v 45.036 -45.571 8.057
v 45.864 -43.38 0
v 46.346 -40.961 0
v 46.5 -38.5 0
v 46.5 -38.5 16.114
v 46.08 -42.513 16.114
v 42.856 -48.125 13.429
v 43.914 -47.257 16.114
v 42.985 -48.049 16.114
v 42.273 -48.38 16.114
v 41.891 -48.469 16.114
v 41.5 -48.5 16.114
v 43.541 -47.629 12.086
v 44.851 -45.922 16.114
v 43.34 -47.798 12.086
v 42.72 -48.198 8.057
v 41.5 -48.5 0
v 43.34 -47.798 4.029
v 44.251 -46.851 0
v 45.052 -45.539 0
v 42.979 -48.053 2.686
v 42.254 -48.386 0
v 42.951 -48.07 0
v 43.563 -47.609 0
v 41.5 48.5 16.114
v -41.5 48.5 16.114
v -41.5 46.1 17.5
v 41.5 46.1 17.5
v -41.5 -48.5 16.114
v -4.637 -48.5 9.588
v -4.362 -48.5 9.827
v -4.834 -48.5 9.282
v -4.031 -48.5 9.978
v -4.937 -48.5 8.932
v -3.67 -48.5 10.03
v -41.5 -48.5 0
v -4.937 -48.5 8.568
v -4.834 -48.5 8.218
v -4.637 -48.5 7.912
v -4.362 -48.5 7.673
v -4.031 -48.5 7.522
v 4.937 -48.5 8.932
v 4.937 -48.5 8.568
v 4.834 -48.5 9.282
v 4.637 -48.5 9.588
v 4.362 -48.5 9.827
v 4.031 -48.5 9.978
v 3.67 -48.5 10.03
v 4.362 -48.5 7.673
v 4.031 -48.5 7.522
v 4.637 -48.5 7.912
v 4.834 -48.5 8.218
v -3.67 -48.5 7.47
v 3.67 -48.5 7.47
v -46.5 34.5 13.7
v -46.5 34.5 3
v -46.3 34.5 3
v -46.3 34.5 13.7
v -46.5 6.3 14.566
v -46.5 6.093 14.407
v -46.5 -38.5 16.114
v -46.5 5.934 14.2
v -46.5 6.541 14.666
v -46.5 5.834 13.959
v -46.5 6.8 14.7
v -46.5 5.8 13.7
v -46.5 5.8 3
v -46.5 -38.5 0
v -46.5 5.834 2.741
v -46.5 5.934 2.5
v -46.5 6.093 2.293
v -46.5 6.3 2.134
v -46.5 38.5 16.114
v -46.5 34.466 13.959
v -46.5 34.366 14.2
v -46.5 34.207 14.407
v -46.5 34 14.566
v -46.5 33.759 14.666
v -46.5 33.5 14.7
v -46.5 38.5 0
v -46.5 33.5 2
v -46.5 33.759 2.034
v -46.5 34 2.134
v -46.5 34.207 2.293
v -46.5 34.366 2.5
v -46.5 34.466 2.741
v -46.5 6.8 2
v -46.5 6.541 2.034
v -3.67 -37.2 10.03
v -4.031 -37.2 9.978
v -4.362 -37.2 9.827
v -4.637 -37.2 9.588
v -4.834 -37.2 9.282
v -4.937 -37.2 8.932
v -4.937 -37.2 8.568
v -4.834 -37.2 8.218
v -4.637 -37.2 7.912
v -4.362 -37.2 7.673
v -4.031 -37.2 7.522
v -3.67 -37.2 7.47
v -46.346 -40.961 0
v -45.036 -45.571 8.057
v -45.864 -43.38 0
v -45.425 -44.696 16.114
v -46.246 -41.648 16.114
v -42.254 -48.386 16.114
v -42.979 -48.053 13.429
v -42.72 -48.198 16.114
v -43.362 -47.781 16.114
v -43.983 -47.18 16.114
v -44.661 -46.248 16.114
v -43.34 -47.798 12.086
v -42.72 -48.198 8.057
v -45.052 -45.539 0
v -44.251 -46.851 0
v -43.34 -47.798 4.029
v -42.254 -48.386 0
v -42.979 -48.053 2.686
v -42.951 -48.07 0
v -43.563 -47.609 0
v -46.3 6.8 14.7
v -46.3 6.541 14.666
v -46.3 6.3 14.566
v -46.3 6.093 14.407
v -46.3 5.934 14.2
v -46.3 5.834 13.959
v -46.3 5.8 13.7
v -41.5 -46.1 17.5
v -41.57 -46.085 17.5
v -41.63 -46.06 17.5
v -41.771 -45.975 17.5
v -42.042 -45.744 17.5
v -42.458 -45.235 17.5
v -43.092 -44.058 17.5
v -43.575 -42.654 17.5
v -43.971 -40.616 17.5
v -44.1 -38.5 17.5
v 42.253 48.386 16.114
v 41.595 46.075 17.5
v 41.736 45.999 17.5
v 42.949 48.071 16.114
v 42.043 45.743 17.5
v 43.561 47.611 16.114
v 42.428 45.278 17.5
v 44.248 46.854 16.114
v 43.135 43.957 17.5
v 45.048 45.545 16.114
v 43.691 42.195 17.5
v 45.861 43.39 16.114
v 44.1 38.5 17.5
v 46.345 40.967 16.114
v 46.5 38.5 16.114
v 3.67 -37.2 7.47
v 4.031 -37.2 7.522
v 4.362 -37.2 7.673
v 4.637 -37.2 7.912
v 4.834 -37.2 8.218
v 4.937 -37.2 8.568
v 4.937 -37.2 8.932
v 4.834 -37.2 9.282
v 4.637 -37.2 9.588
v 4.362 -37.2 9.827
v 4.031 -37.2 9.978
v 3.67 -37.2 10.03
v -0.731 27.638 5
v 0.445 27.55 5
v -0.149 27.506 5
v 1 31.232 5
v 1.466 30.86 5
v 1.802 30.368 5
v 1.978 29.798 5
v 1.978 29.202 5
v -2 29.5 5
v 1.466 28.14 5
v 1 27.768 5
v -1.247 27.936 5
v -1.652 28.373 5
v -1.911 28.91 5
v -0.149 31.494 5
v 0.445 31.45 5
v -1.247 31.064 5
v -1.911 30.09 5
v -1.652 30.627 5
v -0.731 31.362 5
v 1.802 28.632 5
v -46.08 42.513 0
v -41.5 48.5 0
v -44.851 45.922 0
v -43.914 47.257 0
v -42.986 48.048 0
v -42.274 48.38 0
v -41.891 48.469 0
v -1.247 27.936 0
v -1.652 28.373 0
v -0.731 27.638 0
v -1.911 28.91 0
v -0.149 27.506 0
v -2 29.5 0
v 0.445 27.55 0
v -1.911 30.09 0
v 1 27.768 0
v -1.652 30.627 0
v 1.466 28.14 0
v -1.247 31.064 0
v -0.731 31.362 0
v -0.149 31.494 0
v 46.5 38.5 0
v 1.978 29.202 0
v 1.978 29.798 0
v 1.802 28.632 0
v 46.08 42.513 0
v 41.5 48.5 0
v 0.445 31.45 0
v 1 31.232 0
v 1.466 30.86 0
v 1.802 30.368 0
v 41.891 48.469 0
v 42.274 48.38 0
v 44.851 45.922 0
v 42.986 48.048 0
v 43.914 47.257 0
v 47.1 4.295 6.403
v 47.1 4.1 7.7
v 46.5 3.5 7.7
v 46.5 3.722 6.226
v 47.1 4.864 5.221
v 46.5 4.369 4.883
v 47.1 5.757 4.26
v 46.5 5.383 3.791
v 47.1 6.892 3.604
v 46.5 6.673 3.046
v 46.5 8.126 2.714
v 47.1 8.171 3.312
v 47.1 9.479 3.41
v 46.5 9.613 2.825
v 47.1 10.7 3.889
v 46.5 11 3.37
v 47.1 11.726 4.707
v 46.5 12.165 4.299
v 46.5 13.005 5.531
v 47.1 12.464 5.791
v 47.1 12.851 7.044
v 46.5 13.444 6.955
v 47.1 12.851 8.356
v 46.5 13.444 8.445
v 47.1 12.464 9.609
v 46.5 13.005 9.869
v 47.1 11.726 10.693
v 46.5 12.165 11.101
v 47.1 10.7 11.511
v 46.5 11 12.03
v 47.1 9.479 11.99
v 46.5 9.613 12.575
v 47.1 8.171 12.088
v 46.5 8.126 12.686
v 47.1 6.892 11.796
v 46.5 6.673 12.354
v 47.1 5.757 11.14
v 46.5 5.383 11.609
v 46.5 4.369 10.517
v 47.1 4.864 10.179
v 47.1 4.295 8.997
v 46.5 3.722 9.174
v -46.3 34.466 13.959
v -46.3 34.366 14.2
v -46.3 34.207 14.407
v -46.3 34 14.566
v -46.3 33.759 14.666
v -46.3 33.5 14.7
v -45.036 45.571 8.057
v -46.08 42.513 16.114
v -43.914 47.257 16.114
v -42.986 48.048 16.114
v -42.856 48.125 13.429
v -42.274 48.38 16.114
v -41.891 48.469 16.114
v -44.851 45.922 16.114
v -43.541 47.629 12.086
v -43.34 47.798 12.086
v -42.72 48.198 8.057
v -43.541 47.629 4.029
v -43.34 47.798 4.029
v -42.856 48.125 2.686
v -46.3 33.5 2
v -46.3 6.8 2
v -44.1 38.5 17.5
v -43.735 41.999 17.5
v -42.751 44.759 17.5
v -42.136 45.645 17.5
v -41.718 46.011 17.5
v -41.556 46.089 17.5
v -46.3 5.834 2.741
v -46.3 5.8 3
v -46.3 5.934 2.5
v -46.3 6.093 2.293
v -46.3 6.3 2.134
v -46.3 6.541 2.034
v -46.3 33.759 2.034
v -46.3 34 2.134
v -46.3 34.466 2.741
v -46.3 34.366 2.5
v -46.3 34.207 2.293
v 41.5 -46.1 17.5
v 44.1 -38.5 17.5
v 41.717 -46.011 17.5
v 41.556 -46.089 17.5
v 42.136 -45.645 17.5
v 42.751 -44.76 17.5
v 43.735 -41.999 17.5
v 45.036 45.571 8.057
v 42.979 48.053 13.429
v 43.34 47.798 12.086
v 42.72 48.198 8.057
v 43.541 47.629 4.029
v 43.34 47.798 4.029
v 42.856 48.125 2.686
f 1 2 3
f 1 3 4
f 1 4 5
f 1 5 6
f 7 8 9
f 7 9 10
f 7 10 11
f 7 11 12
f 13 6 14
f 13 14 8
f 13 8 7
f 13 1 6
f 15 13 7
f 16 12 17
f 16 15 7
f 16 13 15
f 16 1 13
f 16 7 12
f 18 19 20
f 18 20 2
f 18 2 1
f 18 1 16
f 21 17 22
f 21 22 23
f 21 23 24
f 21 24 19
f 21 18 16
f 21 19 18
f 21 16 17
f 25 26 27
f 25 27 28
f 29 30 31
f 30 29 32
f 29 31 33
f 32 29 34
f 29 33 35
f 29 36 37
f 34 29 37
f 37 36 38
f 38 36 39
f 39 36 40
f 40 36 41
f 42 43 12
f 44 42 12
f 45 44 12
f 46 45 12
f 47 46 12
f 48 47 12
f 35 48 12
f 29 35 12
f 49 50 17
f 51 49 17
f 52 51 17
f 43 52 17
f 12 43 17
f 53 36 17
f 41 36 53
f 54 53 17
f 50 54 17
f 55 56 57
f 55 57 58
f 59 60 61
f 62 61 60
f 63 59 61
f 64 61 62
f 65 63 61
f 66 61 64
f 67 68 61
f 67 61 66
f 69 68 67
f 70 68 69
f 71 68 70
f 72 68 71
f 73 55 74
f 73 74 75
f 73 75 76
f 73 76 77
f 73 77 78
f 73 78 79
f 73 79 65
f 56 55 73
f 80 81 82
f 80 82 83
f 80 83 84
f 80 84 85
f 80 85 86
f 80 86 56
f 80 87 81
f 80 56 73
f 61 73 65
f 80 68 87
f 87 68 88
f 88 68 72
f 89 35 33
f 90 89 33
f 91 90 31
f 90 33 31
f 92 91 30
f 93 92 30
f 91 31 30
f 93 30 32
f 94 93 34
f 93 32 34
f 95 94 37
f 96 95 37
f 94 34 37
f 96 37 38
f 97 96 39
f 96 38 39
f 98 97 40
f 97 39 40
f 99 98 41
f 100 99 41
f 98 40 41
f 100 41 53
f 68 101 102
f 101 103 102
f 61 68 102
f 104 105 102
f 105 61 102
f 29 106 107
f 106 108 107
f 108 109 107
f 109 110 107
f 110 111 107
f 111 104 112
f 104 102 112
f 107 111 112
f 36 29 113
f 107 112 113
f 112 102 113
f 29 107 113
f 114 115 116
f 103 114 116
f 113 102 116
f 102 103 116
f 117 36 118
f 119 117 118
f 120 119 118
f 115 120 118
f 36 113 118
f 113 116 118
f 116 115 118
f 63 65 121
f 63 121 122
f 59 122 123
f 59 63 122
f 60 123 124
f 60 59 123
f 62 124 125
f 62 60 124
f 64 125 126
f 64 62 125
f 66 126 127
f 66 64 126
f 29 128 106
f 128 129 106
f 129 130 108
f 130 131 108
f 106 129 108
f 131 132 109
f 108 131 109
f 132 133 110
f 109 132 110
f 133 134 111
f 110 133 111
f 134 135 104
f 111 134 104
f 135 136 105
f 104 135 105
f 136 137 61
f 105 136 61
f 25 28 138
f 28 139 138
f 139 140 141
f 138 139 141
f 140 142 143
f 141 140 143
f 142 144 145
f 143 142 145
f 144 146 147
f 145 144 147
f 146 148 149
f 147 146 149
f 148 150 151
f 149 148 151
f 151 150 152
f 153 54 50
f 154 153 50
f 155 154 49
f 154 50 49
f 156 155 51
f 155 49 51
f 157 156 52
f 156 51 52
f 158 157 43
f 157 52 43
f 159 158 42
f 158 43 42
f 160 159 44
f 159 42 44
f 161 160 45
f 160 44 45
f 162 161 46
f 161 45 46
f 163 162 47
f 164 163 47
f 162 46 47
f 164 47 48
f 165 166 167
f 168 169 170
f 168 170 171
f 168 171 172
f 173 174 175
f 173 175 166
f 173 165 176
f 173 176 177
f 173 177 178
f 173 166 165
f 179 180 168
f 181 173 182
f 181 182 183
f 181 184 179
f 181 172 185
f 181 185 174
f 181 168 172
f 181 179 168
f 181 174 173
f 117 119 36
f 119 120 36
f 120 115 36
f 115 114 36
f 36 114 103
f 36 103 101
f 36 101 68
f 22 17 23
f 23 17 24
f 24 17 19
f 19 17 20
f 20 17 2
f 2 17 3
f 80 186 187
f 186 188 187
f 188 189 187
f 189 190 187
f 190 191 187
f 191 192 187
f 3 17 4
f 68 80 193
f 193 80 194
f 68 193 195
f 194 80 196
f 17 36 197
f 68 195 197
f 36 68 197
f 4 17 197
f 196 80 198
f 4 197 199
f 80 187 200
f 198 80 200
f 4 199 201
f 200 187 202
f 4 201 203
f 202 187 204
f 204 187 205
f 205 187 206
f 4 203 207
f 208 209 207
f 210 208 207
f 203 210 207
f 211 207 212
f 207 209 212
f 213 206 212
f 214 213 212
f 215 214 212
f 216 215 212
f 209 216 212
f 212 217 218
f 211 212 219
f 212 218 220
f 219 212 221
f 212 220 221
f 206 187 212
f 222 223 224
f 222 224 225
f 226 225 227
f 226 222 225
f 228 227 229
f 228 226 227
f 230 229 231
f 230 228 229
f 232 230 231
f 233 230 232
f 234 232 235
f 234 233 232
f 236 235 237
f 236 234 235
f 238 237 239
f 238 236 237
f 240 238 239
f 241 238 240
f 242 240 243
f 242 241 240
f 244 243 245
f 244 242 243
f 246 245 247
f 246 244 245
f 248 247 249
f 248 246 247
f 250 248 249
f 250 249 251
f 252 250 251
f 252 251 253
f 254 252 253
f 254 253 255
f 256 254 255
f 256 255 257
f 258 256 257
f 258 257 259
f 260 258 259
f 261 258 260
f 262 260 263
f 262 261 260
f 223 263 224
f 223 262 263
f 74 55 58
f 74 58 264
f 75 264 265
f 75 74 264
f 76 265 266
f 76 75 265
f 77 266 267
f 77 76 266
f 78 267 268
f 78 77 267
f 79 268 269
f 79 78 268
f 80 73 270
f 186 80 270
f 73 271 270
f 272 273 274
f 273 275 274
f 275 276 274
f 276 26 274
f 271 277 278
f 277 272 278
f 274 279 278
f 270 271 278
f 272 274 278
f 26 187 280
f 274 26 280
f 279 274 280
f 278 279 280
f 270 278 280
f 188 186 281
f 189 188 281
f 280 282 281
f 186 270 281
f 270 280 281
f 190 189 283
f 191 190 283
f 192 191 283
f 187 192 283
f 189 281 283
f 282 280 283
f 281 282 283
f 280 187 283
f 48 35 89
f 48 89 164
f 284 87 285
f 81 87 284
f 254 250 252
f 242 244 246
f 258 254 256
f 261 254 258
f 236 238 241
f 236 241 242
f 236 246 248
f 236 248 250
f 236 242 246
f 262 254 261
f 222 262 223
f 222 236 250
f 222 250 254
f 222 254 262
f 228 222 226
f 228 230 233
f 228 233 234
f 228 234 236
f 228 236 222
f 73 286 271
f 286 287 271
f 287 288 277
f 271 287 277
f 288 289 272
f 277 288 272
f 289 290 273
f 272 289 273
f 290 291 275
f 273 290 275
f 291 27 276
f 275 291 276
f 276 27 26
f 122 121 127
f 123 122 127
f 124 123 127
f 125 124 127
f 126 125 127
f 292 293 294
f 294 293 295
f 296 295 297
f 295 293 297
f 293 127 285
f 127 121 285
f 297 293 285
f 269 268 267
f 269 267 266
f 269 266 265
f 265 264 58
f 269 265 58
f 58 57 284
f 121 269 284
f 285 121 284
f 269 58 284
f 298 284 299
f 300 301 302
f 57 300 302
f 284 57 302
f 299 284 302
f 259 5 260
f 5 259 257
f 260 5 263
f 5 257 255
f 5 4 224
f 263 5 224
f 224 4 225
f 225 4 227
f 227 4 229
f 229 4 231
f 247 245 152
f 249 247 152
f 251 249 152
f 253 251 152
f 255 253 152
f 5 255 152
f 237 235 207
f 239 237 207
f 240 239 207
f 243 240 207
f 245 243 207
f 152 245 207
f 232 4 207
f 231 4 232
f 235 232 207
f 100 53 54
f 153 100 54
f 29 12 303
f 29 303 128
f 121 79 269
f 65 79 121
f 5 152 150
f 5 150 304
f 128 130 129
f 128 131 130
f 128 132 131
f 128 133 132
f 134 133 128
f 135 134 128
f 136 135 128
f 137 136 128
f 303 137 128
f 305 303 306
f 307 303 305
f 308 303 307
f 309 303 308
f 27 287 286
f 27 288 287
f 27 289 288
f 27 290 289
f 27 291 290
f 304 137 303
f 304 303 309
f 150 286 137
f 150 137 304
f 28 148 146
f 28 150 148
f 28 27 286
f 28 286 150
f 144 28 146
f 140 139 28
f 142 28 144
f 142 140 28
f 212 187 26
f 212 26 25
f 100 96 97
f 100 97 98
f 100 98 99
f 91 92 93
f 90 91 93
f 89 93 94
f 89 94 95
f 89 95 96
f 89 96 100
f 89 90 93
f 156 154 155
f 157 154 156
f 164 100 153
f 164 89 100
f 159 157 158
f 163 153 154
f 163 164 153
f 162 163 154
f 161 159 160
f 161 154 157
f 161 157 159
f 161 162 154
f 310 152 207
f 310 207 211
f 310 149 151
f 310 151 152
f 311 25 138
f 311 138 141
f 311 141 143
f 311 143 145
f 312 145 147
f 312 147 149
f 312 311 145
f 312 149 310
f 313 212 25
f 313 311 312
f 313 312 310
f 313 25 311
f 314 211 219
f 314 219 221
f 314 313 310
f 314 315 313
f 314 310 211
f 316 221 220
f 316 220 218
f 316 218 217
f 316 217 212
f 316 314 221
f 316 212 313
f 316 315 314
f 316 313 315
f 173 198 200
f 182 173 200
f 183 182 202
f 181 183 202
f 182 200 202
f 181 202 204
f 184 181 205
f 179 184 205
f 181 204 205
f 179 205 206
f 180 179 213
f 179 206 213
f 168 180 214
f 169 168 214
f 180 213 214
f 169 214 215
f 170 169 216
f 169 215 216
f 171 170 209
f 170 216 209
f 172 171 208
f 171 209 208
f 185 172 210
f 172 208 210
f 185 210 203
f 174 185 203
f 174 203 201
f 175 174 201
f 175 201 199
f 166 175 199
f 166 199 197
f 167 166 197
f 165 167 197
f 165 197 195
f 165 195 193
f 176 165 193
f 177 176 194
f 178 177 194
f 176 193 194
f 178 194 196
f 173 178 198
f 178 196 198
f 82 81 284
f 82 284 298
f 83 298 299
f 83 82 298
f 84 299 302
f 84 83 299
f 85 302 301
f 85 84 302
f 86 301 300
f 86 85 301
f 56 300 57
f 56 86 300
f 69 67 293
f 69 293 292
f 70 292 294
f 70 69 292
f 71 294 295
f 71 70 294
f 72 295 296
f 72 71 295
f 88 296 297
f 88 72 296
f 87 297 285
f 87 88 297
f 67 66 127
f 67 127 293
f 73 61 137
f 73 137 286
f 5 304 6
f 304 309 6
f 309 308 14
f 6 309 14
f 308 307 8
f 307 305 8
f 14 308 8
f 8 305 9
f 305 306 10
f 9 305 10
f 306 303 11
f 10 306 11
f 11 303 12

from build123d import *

# Parameters (mm, degrees)
SKETCH1_W           = 93
SKETCH1_H           = 97
BOSS_EXTRUDE1_DEPTH = 17.5
FILLET1_SIZE        = 5
FILLET1_SIZE_2      = 10
FILLET2_SIZE        = 10
FILLET2_SIZE_2      = 5
FILLET3_SIZE        = 5
FILLET3_SIZE_2      = 10
SKETCH2_R           = 1.28
SKETCH2_W           = 7.34
SKETCH2_H           = 2.56
CUT_EXTRUDE1_DEPTH  = 11.3
SKETCH3_R           = 5
BOSS_EXTRUDE2_DEPTH = 0.6
CHAMFER1_SIZE       = 0.6
CUT_EXTRUDE2_DEPTH  = 0.2
CHAMFER4_SIZE       = 2.4
CHAMFER4_SIZE2      = 1.385640646
SKETCH5_R           = 2
CUT_EXTRUDE3_DEPTH  = 5


# Some blends are built 0.0001 mm under size
with BuildPart() as part:
    # Sketch1 → Boss-Extrude1 (new body)
    with BuildSketch(Plane.XY):
        Rectangle(SKETCH1_W, SKETCH1_H)
    extrude(amount=BOSS_EXTRUDE1_DEPTH)

    # Fillet1
    # an asymmetric fillet: 10, 5 mm, written as the material it takes off along each edge
    with BuildSketch(Plane(origin=(-46.5, 48.5, -25), x_dir=(1, 0, 0), z_dir=(0, 0, 1))) as fillet1_piece_1:
        with BuildLine():
            Bezier((FILLET1_SIZE, 0), (0, 0), (0, -FILLET1_SIZE_2), weights=[1, 0.707106781, 1])
            Line((0, -FILLET1_SIZE_2), (0, 0))
            Line((0, 0), (FILLET1_SIZE, 0))
        make_face()
    extrude(amount=67.5, mode=Mode.SUBTRACT)
    with BuildSketch(Plane(origin=(46.5, -48.5, -25), x_dir=(0, 1, 0), z_dir=(0, 0, 1))) as fillet1_piece_2:
        with BuildLine():
            Bezier((FILLET1_SIZE_2, 0), (0, 0), (0, FILLET1_SIZE), weights=[1, 0.707106781, 1])
            Line((0, FILLET1_SIZE), (0, 0))
            Line((0, 0), (FILLET1_SIZE_2, 0))
        make_face()
    extrude(amount=67.5, mode=Mode.SUBTRACT)

    # Fillet2
    # an asymmetric fillet: 10, 5 mm, written as the material it takes off along each edge
    with BuildSketch(Plane(origin=(-46.5, -48.5, -25), x_dir=(0, 1, 0), z_dir=(0, 0, 1))) as fillet2_piece_1:
        with BuildLine():
            Bezier((FILLET2_SIZE, 0), (0, 0), (0, -FILLET2_SIZE_2), weights=[1, 0.707106781, 1])
            Line((0, -FILLET2_SIZE_2), (0, 0))
            Line((0, 0), (FILLET2_SIZE, 0))
        make_face()
    extrude(amount=67.5, mode=Mode.SUBTRACT)

    # Fillet3
    # an asymmetric fillet: 10, 5 mm, written as the material it takes off along each edge
    with BuildSketch(Plane(origin=(46.5, 48.5, -25), x_dir=(-1, 0, 0), z_dir=(0, 0, 1))) as fillet3_piece_1:
        with BuildLine():
            Bezier((FILLET3_SIZE, 0), (0, 0), (0, FILLET3_SIZE_2), weights=[1, 0.707106781, 1])
            Line((0, FILLET3_SIZE_2), (0, 0))
            Line((0, 0), (FILLET3_SIZE, 0))
        make_face()
    extrude(amount=67.5, mode=Mode.SUBTRACT)

    # Sketch2 → Cut-Extrude1 (cut)
    with BuildSketch(Plane.XZ.offset(48.5)):
        with Locations((-3.67, 8.75)):
            Circle(SKETCH2_R)
        with Locations((3.67, 8.75)):
            Circle(SKETCH2_R)
        with Locations((0, 8.75)):
            Rectangle(SKETCH2_W, SKETCH2_H)
    extrude(amount=-CUT_EXTRUDE1_DEPTH, mode=Mode.SUBTRACT)

    # Sketch3 → Boss-Extrude2 (add)
    with BuildSketch(Plane(origin=(46.5, 0, 0), x_dir=(0, 0, -1), z_dir=(1, 0, 0))):
        with Locations(Location((-7.7, 8.5, 0), (0, 0, 270))):
            Circle(SKETCH3_R)
    extrude(amount=BOSS_EXTRUDE2_DEPTH)

    # Chamfer1
    chamfer1_edges = [part.edges().sort_by_distance(p)[0] for p in [
        (47.1, 13.5, 7.7),
    ]]
    chamfer(chamfer1_edges, length=CHAMFER1_SIZE - 0.0001)  # a hair under: the kernel refuses the full size

    # Sketch4 → Cut-Extrude2 (cut)
    with BuildSketch(Plane.ZY.offset(46.5)):
        with BuildLine():
            Line((3, 34.5), (13.7, 34.5))
            ThreePointArc((13.7, 34.5), (14.407106781, 34.207106781), (14.7, 33.5))
            Line((14.7, 33.5), (14.7, 6.8))
            ThreePointArc((14.7, 6.8), (14.407106781, 6.092893219), (13.7, 5.8))
            Line((13.7, 5.8), (3, 5.8))
            ThreePointArc((3, 5.8), (2.292893219, 6.092893219), (2, 6.8))
            Line((2, 6.8), (2, 33.5))
            ThreePointArc((2, 33.5), (2.292893219, 34.207106781), (3, 34.5))
        make_face()
    extrude(amount=-CUT_EXTRUDE2_DEPTH, mode=Mode.SUBTRACT)

    # Chamfer4
    chamfer4_edges = [part.edges().sort_by_distance(p)[0] for p in [
        (-45.520581957, 44.444718915, 17.5),
        (-46.5, 0, 17.5),
        (0, 48.5, 17.5),
        (-45.52058196, -44.444718917, 17.5),
        (45.520581957, 44.444718915, 17.5),
        (0, -48.5, 17.5),
        (46.5, 0, 17.5),
        (45.52058196, -44.444718917, 17.5),
    ]]
    chamfer4_side = [part.faces().sort_by_distance(p)[0] for p in [
        (0, 4.215e-06, 17.5),
    ]]
    chamfer(chamfer4_edges, length=CHAMFER4_SIZE, length2=CHAMFER4_SIZE2, reference=chamfer4_side[0])

    # Sketch5 → Cut-Extrude3 (cut)
    with BuildSketch(Plane(origin=(0, 0, 0), x_dir=(-1, 0, 0), z_dir=(0, 0, -1))):
        with Locations((0, 29.5)):
            Circle(SKETCH5_R)
    extrude(amount=-CUT_EXTRUDE3_DEPTH, mode=Mode.SUBTRACT)


solid = part.part
